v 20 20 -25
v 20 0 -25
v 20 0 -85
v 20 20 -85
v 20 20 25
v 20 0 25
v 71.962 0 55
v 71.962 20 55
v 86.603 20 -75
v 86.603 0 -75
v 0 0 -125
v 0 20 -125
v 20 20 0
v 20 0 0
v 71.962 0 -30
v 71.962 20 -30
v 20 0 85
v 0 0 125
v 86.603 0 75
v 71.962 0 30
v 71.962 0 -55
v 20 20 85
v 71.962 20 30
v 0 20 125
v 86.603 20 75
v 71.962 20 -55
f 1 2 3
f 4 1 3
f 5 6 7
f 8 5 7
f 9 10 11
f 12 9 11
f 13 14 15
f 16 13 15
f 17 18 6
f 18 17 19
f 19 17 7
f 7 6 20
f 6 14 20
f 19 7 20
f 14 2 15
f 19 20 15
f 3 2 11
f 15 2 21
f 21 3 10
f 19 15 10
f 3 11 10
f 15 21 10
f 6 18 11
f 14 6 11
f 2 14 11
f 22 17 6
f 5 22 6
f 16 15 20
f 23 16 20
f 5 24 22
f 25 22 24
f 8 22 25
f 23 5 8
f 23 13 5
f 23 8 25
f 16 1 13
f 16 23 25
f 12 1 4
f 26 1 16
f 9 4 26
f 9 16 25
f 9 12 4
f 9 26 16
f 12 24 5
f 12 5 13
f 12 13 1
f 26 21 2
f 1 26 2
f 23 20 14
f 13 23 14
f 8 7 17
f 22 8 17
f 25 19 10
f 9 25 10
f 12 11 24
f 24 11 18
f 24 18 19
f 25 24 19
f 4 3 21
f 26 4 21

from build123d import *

# Parameters (mm, degrees)
BOSS_EXTRUDE1_DEPTH = 20


with BuildPart() as part:
    # Sketch1 → Boss-Extrude1 (new body)
    with BuildSketch(Plane(origin=(0, 0, 0), x_dir=(1, 0, 0), z_dir=(0, 1, 0))):
        Polygon((0, 125), (0, -125), (86.602540378, -75), (86.602540378, 75), align=None)
        Polygon((20, -85), (20, -25), (71.961524227, -55), align=None, mode=Mode.SUBTRACT)
        Polygon((20, 25), (20, 85), (71.961524227, 55), align=None, mode=Mode.SUBTRACT)
        Polygon((20, 0), (71.961524227, 30), (71.961524227, -30), align=None, mode=Mode.SUBTRACT)
    extrude(amount=BOSS_EXTRUDE1_DEPTH)


solid = part.part
